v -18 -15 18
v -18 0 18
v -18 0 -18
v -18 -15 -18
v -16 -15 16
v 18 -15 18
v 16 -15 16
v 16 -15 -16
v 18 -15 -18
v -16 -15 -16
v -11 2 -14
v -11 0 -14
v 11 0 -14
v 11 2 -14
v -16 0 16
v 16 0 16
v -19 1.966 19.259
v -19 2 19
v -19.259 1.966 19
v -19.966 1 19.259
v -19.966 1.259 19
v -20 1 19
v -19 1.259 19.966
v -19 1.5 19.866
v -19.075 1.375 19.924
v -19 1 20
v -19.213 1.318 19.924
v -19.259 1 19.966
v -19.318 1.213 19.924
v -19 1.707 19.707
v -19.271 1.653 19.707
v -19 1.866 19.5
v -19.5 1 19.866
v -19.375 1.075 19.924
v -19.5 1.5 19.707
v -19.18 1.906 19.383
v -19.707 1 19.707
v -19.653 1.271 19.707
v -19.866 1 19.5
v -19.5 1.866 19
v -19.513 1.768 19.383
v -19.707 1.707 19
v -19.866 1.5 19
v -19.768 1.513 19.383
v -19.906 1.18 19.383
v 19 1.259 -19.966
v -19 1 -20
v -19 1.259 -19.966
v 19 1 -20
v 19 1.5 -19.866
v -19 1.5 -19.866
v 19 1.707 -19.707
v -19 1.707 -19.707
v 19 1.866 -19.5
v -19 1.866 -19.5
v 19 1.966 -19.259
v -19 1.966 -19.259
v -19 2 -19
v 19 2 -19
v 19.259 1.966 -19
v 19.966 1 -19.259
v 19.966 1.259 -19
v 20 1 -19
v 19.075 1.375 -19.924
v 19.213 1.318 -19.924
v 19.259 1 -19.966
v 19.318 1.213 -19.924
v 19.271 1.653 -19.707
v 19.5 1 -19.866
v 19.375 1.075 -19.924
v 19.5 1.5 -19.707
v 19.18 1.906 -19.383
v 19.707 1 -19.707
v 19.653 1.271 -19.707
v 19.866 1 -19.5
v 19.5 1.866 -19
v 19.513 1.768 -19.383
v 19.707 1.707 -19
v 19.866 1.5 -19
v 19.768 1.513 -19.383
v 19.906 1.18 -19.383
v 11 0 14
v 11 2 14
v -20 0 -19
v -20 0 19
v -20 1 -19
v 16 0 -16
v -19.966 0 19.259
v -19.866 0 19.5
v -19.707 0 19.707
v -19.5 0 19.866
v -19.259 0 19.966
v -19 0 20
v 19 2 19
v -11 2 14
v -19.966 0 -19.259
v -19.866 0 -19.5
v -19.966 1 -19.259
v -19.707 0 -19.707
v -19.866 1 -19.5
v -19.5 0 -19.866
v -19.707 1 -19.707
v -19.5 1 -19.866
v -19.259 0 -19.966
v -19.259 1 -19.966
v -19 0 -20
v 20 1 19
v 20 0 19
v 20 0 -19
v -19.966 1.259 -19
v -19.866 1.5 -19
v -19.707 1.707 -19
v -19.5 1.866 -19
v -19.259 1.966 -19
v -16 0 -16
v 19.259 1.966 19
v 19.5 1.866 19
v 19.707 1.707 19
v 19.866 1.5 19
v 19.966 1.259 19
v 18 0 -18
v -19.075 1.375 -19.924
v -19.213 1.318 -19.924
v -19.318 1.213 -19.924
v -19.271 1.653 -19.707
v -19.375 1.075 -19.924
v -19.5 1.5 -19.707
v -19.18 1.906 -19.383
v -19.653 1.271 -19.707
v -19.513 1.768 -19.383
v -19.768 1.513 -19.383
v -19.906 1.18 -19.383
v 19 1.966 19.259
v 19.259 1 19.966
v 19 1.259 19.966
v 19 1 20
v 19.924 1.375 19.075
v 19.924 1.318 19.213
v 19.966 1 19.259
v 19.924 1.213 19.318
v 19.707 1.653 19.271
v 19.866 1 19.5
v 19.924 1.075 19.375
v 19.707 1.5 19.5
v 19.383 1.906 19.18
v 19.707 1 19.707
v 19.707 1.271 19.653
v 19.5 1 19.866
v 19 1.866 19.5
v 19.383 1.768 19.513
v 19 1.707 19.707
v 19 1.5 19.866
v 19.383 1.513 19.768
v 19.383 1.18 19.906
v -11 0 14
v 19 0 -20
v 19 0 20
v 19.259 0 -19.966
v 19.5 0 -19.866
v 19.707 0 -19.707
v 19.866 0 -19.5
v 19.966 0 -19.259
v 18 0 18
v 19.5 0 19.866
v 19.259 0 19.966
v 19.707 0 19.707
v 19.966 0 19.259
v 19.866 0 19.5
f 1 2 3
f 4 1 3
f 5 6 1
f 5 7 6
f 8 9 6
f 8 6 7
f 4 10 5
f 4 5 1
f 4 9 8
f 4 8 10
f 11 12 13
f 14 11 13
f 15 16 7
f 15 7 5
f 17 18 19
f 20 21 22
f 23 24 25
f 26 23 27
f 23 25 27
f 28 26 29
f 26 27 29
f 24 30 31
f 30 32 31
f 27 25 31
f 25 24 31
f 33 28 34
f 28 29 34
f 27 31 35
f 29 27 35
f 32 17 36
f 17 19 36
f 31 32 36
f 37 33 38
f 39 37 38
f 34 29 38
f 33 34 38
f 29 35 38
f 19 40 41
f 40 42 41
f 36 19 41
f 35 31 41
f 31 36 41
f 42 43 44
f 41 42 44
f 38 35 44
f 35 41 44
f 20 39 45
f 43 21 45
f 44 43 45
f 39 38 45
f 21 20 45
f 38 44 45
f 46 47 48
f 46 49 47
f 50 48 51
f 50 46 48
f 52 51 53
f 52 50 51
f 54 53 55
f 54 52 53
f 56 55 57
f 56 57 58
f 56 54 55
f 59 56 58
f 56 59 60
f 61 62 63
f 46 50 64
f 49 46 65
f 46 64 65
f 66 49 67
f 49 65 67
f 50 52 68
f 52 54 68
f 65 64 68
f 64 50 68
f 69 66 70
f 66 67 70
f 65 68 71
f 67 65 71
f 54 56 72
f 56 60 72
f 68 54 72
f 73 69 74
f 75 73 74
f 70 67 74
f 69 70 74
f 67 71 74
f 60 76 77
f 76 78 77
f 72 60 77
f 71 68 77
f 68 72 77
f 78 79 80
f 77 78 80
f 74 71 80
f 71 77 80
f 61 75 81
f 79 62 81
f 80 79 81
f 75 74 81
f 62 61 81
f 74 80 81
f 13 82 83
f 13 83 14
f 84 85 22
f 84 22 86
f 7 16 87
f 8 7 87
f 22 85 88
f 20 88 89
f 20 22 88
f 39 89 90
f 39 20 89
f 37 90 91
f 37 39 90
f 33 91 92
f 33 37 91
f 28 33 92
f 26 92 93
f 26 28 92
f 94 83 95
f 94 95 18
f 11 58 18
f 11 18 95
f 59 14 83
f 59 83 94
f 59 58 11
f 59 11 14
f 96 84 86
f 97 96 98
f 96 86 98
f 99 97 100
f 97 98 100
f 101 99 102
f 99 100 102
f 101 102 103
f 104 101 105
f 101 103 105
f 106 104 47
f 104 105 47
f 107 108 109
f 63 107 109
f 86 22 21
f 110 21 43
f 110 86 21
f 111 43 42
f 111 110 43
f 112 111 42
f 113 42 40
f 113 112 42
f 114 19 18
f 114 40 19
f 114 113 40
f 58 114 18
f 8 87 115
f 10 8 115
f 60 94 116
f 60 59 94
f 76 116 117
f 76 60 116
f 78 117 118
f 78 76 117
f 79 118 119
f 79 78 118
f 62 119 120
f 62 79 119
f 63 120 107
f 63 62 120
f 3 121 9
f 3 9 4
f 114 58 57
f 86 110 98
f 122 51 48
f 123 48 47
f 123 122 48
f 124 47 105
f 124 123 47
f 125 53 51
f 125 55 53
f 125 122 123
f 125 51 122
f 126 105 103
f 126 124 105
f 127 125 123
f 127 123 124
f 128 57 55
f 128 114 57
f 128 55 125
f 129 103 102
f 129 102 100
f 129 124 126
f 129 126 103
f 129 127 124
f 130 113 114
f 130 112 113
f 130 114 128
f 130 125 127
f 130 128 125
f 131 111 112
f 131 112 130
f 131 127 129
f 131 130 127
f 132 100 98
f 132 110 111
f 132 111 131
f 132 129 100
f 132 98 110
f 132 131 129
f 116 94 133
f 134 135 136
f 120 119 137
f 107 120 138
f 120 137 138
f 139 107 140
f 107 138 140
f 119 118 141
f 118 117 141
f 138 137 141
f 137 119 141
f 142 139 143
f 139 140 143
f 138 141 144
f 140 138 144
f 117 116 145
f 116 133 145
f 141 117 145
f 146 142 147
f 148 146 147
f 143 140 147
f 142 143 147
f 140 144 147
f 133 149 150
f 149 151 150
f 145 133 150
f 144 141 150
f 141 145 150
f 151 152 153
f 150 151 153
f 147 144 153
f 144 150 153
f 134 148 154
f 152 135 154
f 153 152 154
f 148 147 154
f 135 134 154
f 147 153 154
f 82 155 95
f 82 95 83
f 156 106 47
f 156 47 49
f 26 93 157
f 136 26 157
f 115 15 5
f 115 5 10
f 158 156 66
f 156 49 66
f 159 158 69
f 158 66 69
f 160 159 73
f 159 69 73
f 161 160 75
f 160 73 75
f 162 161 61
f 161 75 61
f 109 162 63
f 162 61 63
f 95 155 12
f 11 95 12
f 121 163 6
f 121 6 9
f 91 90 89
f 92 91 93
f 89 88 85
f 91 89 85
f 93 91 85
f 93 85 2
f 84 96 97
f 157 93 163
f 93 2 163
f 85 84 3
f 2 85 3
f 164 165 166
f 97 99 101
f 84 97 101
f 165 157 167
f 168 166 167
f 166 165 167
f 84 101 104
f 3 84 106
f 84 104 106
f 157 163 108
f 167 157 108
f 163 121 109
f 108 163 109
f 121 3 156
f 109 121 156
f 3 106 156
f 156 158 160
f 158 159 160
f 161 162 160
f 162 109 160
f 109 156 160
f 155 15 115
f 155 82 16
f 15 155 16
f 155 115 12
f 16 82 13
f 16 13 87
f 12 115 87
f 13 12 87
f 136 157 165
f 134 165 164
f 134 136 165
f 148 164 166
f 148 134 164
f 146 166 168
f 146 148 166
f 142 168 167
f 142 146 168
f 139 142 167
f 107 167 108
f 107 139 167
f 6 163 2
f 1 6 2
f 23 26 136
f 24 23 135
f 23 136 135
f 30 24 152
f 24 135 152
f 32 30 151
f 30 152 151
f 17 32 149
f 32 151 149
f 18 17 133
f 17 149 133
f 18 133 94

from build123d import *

# Parameters (mm, degrees)
SKETCH1_W           = 40
SKETCH1_H           = 40
SKETCH1_W_2         = 22
SKETCH1_H_2         = 28
BOSS_EXTRUDE1_DEPTH = 2
SKETCH2_W           = 36
SKETCH2_H           = 36
SKETCH2_W_2         = 32
SKETCH2_H_2         = 32
BOSS_EXTRUDE2_DEPTH = 15
FILLET1_R           = 1


with BuildPart() as part:
    # Sketch1 → Boss-Extrude1 (new body)
    with BuildSketch(Plane(origin=(0, 0, 0), x_dir=(1, 0, 0), z_dir=(0, 1, 0))):
        Rectangle(SKETCH1_W, SKETCH1_H)
        Rectangle(SKETCH1_W_2, SKETCH1_H_2, mode=Mode.SUBTRACT)
    extrude(amount=BOSS_EXTRUDE1_DEPTH)

    # Sketch2 → Boss-Extrude2 (add)
    with BuildSketch(Plane(origin=(0, 0, 0), x_dir=(-1, 0, 0), z_dir=(0, -1, 0))):
        Rectangle(SKETCH2_W, SKETCH2_H)
        Rectangle(SKETCH2_W_2, SKETCH2_H_2, mode=Mode.SUBTRACT)
    extrude(amount=BOSS_EXTRUDE2_DEPTH)

    # Fillet1
    fillet1_edges = [part.edges().sort_by_distance(p)[0] for p in [
        (-20, 2, 0),
        (0, 2, 20),
        (20, 2, 0),
        (0, 2, -20),
        (20, 1, 20),
        (-20, 1, 20),
        (-20, 1, -20),
        (20, 1, -20),
    ]]
    fillet(fillet1_edges, radius=FILLET1_R)


solid = part.part
